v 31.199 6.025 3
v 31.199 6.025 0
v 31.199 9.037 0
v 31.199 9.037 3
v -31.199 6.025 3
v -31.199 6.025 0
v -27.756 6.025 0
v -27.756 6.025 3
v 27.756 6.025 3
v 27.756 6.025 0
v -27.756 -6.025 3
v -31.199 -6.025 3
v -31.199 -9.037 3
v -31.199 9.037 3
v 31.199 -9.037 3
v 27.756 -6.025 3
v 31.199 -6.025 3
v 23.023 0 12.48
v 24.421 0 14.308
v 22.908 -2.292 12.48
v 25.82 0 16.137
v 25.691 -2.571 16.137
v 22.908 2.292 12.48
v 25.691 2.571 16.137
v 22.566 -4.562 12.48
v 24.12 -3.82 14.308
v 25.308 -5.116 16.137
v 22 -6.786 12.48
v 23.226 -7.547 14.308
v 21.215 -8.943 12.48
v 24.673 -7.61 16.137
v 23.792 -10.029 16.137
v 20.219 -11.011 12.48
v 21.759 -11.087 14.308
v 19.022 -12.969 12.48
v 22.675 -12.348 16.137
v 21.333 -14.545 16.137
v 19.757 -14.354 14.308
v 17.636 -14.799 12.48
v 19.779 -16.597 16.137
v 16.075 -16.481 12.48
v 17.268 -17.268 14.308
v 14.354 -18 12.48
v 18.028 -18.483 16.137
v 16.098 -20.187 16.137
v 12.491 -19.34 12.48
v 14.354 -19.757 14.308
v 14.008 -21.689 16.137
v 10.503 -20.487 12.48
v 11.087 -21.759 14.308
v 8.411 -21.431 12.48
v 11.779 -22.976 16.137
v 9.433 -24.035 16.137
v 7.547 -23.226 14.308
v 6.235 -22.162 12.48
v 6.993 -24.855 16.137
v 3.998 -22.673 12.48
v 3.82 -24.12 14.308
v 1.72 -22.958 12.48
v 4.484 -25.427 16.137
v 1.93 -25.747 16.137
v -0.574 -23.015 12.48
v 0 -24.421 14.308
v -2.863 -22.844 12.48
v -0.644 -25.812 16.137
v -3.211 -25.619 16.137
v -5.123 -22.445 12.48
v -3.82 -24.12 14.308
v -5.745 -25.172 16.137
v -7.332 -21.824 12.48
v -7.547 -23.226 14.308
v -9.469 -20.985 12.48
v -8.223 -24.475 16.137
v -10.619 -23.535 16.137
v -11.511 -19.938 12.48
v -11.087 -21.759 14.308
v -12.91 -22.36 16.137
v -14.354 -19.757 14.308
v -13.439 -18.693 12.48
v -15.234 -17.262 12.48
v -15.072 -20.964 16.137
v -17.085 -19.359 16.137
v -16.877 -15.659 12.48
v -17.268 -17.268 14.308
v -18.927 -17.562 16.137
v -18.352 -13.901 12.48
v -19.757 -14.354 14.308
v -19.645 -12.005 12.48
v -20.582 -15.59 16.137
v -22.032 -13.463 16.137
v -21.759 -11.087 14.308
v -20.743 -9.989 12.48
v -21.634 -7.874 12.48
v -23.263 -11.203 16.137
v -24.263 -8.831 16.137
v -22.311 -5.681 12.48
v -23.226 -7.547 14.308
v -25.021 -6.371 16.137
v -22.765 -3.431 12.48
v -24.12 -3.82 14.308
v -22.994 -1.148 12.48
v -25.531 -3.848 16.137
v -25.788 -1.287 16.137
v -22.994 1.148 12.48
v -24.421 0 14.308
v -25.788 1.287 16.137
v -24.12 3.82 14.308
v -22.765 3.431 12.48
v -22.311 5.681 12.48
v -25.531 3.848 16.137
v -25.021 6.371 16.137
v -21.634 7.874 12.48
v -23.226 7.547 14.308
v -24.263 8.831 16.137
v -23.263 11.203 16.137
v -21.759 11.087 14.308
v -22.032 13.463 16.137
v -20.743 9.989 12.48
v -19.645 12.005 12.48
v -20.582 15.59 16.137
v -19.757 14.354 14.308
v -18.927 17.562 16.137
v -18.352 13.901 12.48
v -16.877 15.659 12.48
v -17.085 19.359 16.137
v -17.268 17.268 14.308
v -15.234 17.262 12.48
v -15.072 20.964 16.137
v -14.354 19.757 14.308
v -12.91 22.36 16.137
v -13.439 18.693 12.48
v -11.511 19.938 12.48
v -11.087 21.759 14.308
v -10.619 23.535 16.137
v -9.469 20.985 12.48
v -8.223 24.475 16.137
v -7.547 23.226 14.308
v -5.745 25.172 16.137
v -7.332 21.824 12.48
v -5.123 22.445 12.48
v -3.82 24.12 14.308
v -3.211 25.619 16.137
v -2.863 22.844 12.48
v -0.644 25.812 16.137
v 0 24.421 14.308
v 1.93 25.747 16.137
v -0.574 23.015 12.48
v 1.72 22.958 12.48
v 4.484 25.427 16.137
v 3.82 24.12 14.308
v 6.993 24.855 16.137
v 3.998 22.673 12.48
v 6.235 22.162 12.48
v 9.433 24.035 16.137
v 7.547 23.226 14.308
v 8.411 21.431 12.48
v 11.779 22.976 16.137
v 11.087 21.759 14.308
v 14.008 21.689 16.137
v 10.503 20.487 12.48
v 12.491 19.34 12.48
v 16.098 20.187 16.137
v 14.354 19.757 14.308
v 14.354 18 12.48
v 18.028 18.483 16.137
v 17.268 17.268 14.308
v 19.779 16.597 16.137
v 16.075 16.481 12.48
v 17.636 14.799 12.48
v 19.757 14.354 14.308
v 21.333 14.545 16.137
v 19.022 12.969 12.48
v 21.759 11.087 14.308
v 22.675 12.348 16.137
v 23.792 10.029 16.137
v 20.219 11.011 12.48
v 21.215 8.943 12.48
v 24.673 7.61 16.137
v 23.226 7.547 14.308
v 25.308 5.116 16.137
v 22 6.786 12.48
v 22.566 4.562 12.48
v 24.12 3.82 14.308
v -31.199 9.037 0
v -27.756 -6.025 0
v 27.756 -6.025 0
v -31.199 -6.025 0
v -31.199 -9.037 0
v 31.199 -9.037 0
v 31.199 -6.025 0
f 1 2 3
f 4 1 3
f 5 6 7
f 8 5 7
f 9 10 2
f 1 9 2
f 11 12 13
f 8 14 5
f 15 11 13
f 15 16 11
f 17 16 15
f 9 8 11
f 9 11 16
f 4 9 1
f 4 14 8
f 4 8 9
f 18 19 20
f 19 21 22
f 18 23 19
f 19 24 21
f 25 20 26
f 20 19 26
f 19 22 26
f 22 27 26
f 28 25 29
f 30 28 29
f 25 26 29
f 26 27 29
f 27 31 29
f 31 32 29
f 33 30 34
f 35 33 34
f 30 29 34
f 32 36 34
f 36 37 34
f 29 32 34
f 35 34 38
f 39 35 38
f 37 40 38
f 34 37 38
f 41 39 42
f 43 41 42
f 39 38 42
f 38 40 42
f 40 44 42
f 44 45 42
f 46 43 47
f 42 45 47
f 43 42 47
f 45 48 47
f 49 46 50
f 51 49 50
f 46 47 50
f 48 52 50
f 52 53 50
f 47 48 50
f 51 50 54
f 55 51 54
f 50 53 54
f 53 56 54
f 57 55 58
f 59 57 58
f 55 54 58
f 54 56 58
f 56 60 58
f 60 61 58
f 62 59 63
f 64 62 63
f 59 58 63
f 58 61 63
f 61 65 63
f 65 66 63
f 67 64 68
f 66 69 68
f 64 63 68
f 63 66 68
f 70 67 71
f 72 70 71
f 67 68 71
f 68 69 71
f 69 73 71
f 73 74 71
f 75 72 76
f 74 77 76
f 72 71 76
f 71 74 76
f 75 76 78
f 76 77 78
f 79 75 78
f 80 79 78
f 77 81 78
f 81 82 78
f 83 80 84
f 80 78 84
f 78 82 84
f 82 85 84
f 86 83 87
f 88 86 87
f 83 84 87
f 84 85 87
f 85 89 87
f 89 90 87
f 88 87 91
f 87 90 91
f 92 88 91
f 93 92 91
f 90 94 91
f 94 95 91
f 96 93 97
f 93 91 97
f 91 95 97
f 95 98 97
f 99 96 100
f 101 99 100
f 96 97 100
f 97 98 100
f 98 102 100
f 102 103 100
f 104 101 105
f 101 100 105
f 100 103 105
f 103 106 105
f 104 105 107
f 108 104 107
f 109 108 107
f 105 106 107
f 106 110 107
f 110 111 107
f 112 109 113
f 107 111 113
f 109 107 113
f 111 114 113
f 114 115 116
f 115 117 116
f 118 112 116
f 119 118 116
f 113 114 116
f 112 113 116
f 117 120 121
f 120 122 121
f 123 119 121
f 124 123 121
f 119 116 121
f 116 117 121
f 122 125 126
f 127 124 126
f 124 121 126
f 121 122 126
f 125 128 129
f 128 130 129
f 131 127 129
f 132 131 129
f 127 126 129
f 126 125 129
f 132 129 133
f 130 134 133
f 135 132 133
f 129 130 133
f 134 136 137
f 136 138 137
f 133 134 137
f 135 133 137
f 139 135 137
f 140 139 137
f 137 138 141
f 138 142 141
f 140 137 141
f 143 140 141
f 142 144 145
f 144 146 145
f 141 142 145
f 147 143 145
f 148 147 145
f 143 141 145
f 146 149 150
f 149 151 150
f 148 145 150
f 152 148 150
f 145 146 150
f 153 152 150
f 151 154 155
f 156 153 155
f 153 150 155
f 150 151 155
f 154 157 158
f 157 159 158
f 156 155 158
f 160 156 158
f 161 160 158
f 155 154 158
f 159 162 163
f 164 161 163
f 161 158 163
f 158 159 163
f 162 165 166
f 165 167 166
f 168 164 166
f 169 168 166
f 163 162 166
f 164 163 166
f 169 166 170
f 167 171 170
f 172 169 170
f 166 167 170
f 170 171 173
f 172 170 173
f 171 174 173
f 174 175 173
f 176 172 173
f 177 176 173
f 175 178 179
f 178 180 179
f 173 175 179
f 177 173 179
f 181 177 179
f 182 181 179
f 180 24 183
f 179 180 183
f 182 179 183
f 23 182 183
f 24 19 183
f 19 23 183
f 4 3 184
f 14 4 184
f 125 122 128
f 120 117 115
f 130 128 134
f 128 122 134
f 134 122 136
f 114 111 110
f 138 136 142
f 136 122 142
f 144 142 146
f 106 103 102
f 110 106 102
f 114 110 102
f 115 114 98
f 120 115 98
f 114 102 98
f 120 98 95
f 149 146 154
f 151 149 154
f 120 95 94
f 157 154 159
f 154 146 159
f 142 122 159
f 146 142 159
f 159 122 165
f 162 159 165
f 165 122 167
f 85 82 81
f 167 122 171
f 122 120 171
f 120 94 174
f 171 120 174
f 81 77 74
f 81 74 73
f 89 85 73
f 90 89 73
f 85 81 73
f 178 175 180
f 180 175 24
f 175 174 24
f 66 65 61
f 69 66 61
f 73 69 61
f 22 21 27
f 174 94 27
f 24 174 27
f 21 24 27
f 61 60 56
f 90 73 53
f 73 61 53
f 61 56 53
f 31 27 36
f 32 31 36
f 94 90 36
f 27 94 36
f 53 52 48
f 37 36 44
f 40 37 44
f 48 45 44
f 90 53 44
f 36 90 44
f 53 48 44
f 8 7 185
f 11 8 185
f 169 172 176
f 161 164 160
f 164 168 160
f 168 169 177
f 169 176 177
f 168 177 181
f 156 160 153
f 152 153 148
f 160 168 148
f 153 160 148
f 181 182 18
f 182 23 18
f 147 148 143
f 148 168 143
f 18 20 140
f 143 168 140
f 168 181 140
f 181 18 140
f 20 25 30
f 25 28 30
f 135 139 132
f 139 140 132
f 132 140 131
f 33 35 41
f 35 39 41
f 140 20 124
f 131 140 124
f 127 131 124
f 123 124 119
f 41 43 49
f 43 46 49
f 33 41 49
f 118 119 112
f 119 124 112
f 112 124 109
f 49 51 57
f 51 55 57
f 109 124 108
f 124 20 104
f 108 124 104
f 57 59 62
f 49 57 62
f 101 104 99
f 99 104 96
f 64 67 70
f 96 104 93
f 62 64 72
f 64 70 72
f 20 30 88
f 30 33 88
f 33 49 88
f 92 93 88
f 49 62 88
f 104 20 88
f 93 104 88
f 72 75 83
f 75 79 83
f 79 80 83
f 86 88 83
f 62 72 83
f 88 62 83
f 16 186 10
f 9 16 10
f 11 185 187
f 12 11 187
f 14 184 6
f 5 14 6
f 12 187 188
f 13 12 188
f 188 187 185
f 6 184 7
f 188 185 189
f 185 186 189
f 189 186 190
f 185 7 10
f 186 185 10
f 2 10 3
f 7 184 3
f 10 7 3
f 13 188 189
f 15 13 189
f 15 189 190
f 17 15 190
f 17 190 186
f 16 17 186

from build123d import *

# Parameters (mm, degrees)
F3_DEPTH = 3


with BuildPart() as f1:
    # F0 (on Front) → F1 (revolve)
    with BuildSketch(Plane.XZ):
        Polygon((0, 16.137294), (0, 12.479508), (23.022542, 12.479508), (25.81967, 16.137294), align=None)
    revolve(axis=Axis((0, 0, 14.308401), (0, 0, -1)))


with BuildPart() as f3:
    # F2 (on Top) → F3 (new body)
    with BuildSketch(Plane.XY):
        Polygon((0, 0), (0, -9.036886), (31.19877, -9.036886), (31.19877, -6.02459), (27.756151, -6.02459), (27.756151, 0), align=None)
        Polygon((-31.19877, -9.036886), (0, -9.036886), (0, 0), (-27.756151, 0), (-27.756151, -6.02459), (-31.19877, -6.02459), align=None)
        Polygon((0, 9.036886), (0, 0), (27.756151, 0), (27.756151, 6.02459), (31.19877, 6.02459), (31.19877, 9.036886), align=None)
        Polygon((-27.756151, 0), (0, 0), (0, 9.036886), (-31.19877, 9.036886), (-31.19877, 6.02459), (-27.756151, 6.02459), align=None)
    extrude(amount=F3_DEPTH)


solid = Compound([f1.part, f3.part])
